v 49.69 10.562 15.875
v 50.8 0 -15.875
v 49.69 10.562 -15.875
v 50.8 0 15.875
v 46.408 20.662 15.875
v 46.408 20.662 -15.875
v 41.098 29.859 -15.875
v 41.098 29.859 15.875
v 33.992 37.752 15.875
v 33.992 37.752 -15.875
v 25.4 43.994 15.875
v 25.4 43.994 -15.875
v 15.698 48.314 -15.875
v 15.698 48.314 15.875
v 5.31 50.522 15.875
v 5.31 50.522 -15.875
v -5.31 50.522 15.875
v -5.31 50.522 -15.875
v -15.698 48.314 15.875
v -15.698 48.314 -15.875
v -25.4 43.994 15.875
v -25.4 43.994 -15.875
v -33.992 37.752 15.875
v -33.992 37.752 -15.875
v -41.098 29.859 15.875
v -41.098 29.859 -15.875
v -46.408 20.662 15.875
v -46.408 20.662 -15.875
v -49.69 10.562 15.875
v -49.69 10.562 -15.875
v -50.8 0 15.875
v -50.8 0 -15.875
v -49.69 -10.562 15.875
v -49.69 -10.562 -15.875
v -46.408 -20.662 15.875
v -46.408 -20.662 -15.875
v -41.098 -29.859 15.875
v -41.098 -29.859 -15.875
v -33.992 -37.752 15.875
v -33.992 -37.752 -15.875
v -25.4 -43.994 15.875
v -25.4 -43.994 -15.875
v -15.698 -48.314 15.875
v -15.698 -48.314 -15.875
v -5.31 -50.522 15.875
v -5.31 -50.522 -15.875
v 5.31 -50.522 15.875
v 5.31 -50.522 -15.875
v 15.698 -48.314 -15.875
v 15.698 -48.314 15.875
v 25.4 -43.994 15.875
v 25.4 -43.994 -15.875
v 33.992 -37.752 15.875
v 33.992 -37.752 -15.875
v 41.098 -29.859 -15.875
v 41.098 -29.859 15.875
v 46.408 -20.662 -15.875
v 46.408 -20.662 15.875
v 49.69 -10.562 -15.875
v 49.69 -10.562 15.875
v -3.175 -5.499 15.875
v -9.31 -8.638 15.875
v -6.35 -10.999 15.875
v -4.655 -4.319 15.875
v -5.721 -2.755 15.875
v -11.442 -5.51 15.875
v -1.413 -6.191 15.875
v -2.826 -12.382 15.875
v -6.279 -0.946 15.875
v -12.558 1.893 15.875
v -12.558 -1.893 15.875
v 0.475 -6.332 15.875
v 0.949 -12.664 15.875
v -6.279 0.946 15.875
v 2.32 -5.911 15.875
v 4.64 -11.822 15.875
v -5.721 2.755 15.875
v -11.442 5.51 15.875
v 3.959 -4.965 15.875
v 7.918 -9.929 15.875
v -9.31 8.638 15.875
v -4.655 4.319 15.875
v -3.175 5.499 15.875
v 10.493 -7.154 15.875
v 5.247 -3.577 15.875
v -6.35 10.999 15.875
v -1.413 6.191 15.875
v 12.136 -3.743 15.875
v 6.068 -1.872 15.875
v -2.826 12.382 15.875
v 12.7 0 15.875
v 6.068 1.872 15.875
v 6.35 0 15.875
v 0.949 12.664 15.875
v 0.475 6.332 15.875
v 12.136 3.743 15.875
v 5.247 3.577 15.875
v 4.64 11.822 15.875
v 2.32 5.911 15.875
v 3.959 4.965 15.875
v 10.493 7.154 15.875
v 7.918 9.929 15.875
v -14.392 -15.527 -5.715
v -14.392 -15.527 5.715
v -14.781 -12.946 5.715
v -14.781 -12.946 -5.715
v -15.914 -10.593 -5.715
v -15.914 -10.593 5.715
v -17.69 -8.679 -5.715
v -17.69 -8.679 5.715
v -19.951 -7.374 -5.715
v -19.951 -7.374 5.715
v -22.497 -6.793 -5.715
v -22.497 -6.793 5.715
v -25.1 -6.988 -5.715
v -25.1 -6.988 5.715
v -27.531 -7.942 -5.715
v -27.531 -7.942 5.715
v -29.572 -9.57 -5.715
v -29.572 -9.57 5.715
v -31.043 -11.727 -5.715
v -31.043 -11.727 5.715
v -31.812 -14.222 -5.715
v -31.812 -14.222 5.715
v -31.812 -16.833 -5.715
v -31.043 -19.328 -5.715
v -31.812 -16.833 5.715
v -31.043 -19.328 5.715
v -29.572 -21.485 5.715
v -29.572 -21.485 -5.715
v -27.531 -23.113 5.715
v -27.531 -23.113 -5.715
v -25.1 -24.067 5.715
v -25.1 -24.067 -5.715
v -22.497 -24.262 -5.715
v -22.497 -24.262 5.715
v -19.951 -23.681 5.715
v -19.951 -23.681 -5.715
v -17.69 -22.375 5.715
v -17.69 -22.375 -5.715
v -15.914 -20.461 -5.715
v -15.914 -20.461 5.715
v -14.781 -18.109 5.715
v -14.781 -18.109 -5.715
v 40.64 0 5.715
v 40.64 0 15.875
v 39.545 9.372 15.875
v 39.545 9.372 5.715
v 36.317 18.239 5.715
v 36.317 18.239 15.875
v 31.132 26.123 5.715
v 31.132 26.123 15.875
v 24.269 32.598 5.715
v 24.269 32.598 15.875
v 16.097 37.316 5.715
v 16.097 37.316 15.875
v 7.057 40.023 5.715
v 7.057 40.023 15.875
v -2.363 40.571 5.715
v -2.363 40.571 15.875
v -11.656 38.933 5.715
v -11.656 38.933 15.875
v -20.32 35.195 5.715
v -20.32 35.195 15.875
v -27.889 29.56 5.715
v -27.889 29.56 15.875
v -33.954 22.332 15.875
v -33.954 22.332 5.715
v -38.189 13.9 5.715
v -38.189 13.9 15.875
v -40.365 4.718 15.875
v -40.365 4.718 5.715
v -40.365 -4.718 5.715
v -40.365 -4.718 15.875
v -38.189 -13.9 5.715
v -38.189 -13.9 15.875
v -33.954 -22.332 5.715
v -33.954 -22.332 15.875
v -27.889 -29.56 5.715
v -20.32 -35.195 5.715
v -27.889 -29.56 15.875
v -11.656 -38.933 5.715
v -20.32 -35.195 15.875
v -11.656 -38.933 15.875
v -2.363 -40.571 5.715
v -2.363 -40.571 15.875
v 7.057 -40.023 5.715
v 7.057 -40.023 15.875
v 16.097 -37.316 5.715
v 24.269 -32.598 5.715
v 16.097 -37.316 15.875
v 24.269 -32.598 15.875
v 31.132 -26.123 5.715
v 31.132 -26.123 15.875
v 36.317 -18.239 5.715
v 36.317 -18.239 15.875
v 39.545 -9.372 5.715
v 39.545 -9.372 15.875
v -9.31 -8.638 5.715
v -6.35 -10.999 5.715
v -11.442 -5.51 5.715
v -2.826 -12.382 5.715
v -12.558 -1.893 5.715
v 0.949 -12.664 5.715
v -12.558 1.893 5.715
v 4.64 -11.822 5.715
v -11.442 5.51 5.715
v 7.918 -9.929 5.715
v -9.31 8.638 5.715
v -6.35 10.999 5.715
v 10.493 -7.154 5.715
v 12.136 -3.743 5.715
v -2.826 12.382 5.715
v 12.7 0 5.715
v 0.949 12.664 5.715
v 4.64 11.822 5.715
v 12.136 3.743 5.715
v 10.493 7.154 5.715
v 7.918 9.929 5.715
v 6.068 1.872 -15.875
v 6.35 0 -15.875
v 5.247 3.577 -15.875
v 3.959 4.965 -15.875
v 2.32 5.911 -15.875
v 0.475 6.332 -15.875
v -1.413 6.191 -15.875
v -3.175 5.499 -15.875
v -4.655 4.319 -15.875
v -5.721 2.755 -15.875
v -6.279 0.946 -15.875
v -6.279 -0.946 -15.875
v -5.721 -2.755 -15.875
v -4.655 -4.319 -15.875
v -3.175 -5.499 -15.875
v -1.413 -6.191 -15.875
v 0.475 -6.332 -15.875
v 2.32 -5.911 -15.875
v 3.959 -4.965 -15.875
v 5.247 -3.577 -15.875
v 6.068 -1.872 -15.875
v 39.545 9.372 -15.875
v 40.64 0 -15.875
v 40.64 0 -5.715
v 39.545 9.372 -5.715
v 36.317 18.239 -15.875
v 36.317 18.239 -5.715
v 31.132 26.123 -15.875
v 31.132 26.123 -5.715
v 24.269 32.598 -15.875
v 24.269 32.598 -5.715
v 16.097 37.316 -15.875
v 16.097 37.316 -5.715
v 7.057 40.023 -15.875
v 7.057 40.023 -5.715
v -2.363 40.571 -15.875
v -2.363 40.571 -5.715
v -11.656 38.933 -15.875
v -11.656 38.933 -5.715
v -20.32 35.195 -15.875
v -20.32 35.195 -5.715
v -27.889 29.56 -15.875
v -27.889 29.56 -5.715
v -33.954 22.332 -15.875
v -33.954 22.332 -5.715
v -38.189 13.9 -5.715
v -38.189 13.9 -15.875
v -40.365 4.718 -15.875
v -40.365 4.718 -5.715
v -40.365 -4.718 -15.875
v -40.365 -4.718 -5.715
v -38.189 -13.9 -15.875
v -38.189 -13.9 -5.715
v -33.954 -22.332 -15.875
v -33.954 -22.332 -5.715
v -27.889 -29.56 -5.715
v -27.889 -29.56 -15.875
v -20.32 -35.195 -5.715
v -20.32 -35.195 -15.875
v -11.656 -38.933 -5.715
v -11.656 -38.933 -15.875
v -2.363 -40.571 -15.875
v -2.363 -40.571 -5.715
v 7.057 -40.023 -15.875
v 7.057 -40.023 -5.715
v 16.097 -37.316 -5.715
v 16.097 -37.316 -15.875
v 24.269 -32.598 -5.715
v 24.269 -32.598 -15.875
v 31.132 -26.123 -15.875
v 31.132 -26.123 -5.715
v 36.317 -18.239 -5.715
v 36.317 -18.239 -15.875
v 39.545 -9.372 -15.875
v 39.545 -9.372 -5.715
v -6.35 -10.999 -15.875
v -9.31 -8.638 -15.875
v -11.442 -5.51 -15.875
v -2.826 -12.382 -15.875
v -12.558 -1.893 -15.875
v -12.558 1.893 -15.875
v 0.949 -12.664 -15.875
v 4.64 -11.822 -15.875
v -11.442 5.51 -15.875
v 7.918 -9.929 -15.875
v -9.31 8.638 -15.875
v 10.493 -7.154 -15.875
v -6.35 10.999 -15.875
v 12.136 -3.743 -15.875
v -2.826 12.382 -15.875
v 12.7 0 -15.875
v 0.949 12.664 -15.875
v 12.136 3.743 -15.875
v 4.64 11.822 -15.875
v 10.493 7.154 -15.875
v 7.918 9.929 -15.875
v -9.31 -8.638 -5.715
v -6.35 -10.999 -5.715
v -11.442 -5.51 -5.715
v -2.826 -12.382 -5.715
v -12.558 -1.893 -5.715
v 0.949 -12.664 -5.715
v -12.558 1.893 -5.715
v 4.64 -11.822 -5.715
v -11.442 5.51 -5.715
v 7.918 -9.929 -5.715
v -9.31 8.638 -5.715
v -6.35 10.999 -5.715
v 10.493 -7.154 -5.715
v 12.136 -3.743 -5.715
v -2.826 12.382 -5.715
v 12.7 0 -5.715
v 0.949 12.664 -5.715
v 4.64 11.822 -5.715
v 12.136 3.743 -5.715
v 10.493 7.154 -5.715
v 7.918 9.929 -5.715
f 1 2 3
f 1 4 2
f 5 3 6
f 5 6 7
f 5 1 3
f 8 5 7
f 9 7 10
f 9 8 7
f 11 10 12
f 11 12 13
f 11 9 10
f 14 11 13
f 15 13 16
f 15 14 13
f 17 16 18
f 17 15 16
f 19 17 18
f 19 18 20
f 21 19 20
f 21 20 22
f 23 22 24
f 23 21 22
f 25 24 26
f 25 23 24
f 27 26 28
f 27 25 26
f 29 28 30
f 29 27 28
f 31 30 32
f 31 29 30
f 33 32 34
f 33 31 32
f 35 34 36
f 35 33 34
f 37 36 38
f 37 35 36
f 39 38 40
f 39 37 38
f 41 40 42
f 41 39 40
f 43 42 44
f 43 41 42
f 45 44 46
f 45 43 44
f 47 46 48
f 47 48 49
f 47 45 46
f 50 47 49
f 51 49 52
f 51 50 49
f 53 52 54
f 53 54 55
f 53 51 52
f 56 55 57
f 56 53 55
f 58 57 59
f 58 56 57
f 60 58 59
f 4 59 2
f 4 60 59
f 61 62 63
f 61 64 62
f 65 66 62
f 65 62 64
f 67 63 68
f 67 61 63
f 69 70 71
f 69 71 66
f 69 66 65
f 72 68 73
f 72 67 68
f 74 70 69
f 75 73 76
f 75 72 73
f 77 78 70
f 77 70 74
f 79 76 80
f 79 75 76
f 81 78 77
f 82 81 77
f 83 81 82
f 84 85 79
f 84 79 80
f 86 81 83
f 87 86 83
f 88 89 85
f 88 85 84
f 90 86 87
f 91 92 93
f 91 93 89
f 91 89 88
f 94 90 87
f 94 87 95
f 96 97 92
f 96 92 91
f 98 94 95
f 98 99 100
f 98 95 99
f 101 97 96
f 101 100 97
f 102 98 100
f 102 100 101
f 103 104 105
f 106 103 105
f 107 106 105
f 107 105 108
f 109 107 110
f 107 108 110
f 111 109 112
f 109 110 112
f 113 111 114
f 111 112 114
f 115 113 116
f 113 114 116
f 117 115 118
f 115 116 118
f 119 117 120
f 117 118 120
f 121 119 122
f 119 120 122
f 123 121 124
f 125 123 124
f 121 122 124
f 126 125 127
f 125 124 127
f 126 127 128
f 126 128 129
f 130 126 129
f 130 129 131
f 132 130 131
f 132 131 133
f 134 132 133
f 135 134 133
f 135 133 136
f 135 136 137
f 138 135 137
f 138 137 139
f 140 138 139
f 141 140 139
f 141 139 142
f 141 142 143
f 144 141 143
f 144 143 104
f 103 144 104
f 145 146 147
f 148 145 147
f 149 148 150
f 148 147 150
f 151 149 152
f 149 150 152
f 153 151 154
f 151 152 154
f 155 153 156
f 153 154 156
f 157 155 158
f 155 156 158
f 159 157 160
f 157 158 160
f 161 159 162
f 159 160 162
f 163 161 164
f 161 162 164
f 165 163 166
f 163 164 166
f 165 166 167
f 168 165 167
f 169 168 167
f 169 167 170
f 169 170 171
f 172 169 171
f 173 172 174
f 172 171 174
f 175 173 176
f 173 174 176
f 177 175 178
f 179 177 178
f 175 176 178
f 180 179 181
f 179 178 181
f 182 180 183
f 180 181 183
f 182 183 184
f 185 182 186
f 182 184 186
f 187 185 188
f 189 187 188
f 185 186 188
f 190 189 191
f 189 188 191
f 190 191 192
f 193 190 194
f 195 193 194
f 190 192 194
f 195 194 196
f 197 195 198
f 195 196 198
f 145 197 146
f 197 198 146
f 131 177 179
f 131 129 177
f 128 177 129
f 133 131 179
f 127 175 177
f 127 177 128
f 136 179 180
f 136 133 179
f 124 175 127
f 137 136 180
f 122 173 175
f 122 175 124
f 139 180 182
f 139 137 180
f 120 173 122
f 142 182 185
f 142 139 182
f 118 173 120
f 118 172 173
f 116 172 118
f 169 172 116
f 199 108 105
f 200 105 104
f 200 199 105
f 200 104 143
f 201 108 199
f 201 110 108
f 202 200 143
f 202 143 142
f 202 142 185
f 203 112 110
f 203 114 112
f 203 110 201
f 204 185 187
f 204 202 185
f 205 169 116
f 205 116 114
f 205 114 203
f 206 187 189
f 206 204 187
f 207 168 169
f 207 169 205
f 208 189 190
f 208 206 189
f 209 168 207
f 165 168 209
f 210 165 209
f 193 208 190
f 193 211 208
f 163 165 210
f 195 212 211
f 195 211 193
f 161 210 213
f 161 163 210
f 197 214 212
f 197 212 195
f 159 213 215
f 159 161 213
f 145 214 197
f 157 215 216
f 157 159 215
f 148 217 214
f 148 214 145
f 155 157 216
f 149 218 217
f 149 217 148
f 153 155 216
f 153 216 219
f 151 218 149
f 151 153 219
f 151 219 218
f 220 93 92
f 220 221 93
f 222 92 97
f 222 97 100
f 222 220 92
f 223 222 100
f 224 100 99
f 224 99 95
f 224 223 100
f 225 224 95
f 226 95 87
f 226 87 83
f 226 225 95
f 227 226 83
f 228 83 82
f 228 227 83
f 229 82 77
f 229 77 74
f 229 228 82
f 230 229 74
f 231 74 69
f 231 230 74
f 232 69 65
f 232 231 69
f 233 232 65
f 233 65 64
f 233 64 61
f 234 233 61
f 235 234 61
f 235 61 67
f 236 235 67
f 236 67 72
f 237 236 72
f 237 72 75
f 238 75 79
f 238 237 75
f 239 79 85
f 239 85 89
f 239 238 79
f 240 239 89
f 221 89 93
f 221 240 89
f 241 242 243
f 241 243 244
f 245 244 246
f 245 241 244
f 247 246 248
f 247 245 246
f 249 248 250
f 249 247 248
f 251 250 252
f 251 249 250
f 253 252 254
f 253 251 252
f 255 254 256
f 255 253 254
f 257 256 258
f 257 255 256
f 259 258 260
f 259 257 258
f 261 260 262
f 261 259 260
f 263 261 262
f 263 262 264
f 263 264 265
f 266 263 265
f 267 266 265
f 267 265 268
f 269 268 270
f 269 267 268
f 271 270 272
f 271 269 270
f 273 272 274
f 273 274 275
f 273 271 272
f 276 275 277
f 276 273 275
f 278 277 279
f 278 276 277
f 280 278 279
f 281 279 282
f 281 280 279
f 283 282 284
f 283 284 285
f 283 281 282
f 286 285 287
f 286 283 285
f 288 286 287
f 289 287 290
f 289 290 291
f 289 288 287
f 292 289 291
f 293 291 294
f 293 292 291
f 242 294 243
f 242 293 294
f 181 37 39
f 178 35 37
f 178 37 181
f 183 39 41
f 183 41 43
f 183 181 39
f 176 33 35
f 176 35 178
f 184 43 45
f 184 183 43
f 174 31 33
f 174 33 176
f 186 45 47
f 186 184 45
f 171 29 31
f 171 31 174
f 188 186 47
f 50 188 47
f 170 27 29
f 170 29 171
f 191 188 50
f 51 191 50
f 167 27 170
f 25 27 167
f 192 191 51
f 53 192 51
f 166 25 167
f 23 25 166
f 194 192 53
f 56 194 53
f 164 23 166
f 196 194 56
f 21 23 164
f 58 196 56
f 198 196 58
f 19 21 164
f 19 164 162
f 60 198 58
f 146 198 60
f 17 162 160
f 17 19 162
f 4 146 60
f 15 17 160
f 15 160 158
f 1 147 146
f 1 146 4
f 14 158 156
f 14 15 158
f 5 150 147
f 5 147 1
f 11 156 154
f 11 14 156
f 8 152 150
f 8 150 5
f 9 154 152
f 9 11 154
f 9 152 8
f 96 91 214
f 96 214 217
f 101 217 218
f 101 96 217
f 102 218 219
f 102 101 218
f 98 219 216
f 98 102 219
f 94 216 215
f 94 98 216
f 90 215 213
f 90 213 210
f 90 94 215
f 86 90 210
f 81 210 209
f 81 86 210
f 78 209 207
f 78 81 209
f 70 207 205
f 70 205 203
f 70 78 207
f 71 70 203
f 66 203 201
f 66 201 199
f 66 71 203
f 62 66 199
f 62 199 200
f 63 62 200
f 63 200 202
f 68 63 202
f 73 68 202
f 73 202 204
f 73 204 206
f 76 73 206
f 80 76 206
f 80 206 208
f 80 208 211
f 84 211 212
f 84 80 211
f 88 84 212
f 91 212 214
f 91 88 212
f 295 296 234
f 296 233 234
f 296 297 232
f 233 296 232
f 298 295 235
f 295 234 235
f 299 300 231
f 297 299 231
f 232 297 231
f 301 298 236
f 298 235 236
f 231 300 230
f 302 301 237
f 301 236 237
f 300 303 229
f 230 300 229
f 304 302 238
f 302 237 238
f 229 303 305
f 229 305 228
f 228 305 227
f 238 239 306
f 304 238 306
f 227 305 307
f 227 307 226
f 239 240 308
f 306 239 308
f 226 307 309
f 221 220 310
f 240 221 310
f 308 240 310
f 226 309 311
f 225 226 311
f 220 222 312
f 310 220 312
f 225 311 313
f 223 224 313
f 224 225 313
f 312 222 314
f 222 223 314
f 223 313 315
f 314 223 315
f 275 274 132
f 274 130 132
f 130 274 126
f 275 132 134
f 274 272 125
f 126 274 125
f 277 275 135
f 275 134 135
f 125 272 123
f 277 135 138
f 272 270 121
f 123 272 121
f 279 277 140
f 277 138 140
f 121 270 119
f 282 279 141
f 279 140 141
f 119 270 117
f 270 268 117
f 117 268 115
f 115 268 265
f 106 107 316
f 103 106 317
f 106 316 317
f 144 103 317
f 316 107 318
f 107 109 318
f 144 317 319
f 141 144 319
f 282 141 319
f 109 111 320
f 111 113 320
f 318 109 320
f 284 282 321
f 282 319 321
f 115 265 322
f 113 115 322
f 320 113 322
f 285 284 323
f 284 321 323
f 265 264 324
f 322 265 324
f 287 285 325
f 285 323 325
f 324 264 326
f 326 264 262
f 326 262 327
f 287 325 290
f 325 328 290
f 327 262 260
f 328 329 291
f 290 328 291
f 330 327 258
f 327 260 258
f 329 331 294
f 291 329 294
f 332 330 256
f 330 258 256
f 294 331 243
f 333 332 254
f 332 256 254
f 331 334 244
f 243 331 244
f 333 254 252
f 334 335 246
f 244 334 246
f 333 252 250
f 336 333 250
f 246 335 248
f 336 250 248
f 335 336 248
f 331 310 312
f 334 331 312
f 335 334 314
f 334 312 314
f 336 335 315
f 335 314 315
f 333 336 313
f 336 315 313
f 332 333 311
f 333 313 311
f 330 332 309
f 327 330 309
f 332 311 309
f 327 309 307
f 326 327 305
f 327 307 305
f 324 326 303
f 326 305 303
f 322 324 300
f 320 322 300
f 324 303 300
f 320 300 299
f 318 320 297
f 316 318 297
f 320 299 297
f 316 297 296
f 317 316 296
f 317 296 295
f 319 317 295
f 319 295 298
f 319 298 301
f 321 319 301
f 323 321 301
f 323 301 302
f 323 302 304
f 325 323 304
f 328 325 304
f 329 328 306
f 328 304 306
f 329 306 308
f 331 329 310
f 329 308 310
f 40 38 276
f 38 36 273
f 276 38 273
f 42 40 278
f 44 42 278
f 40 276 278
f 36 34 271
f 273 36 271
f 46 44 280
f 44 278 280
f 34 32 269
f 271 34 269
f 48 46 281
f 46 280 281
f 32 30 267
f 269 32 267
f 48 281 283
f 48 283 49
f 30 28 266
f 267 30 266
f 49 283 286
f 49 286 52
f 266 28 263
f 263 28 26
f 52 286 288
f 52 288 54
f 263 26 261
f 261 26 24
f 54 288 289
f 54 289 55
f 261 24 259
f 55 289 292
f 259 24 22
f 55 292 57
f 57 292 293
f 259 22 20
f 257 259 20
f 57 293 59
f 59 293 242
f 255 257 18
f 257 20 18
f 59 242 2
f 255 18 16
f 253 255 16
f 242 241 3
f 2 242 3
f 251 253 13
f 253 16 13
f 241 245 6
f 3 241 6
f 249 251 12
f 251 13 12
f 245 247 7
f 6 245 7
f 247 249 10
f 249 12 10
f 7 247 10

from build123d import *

# Parameters (mm, degrees)
SKETCH1_R           = 50.8
SKETCH1_R_2         = 6.35
BOSS_EXTRUDE1_DEPTH = 15.875
SKETCH2_R           = 40.64
SKETCH2_R_2         = 12.7
CUT_EXTRUDE1_DEPTH  = 10.16
CUT_EXTRUDE2_REACH  = 77.016
SKETCH3_R           = 8.758928998


with BuildPart() as part:
    # Sketch1 → Boss-Extrude1 (new, symmetric)
    with BuildSketch(Plane.XY):
        Circle(SKETCH1_R)
        Circle(SKETCH1_R_2, mode=Mode.SUBTRACT)
    extrude(amount=BOSS_EXTRUDE1_DEPTH, both=True)

    # Sketch2 → Cut-Extrude1 (cut)
    with BuildSketch(Plane.XY.offset(15.875)):
        Circle(SKETCH2_R)
        Circle(SKETCH2_R_2, mode=Mode.SUBTRACT)
    cut_extrude1 = extrude(amount=-CUT_EXTRUDE1_DEPTH, mode=Mode.SUBTRACT)

    # Mirror1: Cut-Extrude1 across plane
    add(cut_extrude1.mirror(Plane.XY), mode=Mode.SUBTRACT)

    # Sketch3 → Cut-Extrude2 (cut, up to next)
    with BuildSketch(Plane.XY.offset(5.715), mode=Mode.PRIVATE) as cut_extrude2_sk1:
        with Locations((-23.151287749, -15.527256866)):
            Circle(SKETCH3_R)
    cut_extrude2_tool1 = extrude(cut_extrude2_sk1.sketch, amount=-CUT_EXTRUDE2_REACH, mode=Mode.PRIVATE) & part.part
    add(cut_extrude2_tool1.solids().sort_by_distance((-23.151288, -15.527257, 5.715))[0], mode=Mode.SUBTRACT)


solid = part.part
